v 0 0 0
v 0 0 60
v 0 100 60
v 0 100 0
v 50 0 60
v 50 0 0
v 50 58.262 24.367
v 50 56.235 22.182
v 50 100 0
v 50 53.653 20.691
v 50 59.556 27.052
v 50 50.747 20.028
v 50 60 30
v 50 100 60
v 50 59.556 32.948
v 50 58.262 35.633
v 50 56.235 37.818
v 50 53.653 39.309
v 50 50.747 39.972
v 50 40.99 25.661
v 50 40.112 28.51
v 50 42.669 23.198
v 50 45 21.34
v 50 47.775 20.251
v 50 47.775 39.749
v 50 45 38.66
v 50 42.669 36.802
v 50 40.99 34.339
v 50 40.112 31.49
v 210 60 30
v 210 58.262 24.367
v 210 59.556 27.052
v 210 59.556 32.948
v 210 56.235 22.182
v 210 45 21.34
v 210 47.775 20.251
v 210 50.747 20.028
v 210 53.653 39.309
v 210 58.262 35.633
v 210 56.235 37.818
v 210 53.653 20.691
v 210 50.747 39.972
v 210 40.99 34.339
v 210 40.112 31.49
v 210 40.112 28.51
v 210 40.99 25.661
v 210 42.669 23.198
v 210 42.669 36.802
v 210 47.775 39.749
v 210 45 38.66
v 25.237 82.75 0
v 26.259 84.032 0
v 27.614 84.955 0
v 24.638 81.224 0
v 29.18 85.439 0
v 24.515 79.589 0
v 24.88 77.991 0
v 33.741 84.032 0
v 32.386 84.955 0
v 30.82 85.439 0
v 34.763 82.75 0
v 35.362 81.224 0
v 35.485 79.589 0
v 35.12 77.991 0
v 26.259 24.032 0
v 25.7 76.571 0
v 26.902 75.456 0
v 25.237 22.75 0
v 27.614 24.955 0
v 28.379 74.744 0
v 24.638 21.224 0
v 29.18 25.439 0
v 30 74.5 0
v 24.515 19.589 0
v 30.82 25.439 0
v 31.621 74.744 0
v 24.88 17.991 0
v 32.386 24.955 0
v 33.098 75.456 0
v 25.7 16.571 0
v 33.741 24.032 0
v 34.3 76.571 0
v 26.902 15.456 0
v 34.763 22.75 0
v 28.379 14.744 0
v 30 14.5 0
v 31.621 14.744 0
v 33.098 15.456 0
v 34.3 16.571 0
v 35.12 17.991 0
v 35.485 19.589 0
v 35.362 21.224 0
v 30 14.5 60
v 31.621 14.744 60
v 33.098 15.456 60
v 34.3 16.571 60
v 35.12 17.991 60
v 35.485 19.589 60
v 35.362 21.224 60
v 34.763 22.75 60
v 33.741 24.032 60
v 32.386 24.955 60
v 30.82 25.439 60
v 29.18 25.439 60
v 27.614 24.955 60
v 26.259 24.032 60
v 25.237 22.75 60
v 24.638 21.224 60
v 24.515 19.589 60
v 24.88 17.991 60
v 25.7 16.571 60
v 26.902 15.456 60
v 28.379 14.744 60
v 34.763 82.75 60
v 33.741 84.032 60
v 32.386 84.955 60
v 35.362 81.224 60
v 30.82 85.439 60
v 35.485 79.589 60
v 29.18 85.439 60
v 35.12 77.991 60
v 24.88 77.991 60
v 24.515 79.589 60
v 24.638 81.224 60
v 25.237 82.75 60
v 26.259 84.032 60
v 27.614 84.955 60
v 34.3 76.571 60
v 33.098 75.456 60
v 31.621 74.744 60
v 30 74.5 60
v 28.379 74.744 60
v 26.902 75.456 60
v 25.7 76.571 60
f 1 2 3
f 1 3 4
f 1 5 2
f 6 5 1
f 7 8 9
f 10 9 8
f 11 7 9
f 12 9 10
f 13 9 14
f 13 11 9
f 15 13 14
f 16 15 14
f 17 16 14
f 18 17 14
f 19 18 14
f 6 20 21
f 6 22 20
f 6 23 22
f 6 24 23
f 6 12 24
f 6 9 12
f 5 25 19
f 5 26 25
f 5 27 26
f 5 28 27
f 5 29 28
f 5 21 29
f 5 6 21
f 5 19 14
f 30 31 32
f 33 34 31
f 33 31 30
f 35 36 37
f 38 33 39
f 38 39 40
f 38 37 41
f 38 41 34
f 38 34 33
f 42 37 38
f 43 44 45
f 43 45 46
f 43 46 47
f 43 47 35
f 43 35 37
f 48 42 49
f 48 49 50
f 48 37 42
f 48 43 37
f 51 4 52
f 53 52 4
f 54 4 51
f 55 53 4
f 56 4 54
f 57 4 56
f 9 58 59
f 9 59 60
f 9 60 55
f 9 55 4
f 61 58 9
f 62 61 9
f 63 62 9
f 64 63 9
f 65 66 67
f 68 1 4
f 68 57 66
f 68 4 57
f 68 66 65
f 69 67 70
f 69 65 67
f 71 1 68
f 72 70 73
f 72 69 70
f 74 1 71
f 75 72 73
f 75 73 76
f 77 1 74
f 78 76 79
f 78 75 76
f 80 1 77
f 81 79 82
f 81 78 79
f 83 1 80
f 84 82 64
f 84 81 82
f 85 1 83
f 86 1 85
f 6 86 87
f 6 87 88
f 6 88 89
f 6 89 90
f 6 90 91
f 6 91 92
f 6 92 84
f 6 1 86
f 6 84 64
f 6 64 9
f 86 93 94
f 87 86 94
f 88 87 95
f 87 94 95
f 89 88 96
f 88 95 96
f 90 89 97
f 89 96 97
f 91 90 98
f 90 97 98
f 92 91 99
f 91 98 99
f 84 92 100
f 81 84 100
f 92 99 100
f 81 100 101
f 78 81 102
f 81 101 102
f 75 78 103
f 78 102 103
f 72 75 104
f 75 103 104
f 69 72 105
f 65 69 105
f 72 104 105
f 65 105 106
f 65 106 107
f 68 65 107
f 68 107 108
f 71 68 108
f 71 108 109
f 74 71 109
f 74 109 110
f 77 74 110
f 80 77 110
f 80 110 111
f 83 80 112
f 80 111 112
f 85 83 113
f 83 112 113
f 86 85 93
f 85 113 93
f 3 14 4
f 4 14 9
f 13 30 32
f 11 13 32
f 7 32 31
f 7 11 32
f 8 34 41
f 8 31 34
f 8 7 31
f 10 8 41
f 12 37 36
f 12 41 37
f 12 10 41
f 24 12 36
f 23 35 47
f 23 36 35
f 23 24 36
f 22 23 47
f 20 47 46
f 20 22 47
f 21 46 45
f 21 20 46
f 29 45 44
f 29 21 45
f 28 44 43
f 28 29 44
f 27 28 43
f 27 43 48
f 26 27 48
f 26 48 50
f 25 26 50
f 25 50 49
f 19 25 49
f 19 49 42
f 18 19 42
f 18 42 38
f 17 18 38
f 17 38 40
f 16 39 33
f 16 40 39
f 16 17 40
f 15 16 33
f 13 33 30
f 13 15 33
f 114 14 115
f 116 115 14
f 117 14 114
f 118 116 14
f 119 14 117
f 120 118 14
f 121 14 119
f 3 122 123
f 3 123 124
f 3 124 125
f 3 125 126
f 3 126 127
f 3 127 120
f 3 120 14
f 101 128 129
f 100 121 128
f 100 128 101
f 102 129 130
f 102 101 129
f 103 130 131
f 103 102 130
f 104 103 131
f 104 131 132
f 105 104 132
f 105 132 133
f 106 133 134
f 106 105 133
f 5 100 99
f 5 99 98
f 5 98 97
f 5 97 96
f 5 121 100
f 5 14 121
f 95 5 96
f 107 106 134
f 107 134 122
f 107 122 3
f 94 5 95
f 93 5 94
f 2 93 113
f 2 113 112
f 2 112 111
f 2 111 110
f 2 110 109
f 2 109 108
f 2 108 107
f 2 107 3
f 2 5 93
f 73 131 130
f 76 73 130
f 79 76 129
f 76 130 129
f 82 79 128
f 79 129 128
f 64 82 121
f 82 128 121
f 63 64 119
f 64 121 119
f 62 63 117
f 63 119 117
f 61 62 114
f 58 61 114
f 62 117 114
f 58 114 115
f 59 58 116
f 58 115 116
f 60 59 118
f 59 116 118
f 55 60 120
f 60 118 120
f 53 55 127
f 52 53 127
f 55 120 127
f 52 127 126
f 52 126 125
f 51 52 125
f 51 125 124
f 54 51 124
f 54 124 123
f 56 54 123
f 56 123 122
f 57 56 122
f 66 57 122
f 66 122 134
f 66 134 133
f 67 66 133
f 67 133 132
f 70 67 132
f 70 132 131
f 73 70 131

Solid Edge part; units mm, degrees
sketch "Sketch1" plane through (0, 0, 0) normal (0, -1, 0) x (1, 0, 0)
  line L0 (50, 0) -> (50, 60)
  line L1 (50, 60) -> (0, 60)
  line L2 (0, 60) -> (0, 0)
  line L3 (0, 0) -> (50, 0)
extrude "Protrusion1" add sketch "Sketch1" against normal blind 100
hole "Bohrung_1" at (30, 80, 60) direction (0, 0, -1) diameter 11 end up to next
hole "Hole1" at (30, 20, 60) direction (0, 0, -1) diameter 11 end up to next
sketch "Sketch2" plane through (50, 50, 30) normal (1, 0, 0) x (0, 1, 0)
  circle A0 centre (0, 0) radius 10
extrude "Extrusionsausprägung_2" add sketch "Sketch2" along normal blind 160
